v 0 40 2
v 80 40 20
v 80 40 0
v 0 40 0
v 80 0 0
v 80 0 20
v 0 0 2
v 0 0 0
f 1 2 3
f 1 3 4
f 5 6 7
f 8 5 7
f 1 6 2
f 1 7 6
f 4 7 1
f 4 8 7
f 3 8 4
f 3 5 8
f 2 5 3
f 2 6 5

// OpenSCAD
ramp_length = 80; width = 40; min_height = 2; max_height = 20;
// XZ profile extruded along +Y
rotate([90, 0, 0]) translate([0, 0, -width])
  linear_extrude(width) polygon([[0, 0], [ramp_length, 0], [ramp_length, max_height], [0, min_height]]);
